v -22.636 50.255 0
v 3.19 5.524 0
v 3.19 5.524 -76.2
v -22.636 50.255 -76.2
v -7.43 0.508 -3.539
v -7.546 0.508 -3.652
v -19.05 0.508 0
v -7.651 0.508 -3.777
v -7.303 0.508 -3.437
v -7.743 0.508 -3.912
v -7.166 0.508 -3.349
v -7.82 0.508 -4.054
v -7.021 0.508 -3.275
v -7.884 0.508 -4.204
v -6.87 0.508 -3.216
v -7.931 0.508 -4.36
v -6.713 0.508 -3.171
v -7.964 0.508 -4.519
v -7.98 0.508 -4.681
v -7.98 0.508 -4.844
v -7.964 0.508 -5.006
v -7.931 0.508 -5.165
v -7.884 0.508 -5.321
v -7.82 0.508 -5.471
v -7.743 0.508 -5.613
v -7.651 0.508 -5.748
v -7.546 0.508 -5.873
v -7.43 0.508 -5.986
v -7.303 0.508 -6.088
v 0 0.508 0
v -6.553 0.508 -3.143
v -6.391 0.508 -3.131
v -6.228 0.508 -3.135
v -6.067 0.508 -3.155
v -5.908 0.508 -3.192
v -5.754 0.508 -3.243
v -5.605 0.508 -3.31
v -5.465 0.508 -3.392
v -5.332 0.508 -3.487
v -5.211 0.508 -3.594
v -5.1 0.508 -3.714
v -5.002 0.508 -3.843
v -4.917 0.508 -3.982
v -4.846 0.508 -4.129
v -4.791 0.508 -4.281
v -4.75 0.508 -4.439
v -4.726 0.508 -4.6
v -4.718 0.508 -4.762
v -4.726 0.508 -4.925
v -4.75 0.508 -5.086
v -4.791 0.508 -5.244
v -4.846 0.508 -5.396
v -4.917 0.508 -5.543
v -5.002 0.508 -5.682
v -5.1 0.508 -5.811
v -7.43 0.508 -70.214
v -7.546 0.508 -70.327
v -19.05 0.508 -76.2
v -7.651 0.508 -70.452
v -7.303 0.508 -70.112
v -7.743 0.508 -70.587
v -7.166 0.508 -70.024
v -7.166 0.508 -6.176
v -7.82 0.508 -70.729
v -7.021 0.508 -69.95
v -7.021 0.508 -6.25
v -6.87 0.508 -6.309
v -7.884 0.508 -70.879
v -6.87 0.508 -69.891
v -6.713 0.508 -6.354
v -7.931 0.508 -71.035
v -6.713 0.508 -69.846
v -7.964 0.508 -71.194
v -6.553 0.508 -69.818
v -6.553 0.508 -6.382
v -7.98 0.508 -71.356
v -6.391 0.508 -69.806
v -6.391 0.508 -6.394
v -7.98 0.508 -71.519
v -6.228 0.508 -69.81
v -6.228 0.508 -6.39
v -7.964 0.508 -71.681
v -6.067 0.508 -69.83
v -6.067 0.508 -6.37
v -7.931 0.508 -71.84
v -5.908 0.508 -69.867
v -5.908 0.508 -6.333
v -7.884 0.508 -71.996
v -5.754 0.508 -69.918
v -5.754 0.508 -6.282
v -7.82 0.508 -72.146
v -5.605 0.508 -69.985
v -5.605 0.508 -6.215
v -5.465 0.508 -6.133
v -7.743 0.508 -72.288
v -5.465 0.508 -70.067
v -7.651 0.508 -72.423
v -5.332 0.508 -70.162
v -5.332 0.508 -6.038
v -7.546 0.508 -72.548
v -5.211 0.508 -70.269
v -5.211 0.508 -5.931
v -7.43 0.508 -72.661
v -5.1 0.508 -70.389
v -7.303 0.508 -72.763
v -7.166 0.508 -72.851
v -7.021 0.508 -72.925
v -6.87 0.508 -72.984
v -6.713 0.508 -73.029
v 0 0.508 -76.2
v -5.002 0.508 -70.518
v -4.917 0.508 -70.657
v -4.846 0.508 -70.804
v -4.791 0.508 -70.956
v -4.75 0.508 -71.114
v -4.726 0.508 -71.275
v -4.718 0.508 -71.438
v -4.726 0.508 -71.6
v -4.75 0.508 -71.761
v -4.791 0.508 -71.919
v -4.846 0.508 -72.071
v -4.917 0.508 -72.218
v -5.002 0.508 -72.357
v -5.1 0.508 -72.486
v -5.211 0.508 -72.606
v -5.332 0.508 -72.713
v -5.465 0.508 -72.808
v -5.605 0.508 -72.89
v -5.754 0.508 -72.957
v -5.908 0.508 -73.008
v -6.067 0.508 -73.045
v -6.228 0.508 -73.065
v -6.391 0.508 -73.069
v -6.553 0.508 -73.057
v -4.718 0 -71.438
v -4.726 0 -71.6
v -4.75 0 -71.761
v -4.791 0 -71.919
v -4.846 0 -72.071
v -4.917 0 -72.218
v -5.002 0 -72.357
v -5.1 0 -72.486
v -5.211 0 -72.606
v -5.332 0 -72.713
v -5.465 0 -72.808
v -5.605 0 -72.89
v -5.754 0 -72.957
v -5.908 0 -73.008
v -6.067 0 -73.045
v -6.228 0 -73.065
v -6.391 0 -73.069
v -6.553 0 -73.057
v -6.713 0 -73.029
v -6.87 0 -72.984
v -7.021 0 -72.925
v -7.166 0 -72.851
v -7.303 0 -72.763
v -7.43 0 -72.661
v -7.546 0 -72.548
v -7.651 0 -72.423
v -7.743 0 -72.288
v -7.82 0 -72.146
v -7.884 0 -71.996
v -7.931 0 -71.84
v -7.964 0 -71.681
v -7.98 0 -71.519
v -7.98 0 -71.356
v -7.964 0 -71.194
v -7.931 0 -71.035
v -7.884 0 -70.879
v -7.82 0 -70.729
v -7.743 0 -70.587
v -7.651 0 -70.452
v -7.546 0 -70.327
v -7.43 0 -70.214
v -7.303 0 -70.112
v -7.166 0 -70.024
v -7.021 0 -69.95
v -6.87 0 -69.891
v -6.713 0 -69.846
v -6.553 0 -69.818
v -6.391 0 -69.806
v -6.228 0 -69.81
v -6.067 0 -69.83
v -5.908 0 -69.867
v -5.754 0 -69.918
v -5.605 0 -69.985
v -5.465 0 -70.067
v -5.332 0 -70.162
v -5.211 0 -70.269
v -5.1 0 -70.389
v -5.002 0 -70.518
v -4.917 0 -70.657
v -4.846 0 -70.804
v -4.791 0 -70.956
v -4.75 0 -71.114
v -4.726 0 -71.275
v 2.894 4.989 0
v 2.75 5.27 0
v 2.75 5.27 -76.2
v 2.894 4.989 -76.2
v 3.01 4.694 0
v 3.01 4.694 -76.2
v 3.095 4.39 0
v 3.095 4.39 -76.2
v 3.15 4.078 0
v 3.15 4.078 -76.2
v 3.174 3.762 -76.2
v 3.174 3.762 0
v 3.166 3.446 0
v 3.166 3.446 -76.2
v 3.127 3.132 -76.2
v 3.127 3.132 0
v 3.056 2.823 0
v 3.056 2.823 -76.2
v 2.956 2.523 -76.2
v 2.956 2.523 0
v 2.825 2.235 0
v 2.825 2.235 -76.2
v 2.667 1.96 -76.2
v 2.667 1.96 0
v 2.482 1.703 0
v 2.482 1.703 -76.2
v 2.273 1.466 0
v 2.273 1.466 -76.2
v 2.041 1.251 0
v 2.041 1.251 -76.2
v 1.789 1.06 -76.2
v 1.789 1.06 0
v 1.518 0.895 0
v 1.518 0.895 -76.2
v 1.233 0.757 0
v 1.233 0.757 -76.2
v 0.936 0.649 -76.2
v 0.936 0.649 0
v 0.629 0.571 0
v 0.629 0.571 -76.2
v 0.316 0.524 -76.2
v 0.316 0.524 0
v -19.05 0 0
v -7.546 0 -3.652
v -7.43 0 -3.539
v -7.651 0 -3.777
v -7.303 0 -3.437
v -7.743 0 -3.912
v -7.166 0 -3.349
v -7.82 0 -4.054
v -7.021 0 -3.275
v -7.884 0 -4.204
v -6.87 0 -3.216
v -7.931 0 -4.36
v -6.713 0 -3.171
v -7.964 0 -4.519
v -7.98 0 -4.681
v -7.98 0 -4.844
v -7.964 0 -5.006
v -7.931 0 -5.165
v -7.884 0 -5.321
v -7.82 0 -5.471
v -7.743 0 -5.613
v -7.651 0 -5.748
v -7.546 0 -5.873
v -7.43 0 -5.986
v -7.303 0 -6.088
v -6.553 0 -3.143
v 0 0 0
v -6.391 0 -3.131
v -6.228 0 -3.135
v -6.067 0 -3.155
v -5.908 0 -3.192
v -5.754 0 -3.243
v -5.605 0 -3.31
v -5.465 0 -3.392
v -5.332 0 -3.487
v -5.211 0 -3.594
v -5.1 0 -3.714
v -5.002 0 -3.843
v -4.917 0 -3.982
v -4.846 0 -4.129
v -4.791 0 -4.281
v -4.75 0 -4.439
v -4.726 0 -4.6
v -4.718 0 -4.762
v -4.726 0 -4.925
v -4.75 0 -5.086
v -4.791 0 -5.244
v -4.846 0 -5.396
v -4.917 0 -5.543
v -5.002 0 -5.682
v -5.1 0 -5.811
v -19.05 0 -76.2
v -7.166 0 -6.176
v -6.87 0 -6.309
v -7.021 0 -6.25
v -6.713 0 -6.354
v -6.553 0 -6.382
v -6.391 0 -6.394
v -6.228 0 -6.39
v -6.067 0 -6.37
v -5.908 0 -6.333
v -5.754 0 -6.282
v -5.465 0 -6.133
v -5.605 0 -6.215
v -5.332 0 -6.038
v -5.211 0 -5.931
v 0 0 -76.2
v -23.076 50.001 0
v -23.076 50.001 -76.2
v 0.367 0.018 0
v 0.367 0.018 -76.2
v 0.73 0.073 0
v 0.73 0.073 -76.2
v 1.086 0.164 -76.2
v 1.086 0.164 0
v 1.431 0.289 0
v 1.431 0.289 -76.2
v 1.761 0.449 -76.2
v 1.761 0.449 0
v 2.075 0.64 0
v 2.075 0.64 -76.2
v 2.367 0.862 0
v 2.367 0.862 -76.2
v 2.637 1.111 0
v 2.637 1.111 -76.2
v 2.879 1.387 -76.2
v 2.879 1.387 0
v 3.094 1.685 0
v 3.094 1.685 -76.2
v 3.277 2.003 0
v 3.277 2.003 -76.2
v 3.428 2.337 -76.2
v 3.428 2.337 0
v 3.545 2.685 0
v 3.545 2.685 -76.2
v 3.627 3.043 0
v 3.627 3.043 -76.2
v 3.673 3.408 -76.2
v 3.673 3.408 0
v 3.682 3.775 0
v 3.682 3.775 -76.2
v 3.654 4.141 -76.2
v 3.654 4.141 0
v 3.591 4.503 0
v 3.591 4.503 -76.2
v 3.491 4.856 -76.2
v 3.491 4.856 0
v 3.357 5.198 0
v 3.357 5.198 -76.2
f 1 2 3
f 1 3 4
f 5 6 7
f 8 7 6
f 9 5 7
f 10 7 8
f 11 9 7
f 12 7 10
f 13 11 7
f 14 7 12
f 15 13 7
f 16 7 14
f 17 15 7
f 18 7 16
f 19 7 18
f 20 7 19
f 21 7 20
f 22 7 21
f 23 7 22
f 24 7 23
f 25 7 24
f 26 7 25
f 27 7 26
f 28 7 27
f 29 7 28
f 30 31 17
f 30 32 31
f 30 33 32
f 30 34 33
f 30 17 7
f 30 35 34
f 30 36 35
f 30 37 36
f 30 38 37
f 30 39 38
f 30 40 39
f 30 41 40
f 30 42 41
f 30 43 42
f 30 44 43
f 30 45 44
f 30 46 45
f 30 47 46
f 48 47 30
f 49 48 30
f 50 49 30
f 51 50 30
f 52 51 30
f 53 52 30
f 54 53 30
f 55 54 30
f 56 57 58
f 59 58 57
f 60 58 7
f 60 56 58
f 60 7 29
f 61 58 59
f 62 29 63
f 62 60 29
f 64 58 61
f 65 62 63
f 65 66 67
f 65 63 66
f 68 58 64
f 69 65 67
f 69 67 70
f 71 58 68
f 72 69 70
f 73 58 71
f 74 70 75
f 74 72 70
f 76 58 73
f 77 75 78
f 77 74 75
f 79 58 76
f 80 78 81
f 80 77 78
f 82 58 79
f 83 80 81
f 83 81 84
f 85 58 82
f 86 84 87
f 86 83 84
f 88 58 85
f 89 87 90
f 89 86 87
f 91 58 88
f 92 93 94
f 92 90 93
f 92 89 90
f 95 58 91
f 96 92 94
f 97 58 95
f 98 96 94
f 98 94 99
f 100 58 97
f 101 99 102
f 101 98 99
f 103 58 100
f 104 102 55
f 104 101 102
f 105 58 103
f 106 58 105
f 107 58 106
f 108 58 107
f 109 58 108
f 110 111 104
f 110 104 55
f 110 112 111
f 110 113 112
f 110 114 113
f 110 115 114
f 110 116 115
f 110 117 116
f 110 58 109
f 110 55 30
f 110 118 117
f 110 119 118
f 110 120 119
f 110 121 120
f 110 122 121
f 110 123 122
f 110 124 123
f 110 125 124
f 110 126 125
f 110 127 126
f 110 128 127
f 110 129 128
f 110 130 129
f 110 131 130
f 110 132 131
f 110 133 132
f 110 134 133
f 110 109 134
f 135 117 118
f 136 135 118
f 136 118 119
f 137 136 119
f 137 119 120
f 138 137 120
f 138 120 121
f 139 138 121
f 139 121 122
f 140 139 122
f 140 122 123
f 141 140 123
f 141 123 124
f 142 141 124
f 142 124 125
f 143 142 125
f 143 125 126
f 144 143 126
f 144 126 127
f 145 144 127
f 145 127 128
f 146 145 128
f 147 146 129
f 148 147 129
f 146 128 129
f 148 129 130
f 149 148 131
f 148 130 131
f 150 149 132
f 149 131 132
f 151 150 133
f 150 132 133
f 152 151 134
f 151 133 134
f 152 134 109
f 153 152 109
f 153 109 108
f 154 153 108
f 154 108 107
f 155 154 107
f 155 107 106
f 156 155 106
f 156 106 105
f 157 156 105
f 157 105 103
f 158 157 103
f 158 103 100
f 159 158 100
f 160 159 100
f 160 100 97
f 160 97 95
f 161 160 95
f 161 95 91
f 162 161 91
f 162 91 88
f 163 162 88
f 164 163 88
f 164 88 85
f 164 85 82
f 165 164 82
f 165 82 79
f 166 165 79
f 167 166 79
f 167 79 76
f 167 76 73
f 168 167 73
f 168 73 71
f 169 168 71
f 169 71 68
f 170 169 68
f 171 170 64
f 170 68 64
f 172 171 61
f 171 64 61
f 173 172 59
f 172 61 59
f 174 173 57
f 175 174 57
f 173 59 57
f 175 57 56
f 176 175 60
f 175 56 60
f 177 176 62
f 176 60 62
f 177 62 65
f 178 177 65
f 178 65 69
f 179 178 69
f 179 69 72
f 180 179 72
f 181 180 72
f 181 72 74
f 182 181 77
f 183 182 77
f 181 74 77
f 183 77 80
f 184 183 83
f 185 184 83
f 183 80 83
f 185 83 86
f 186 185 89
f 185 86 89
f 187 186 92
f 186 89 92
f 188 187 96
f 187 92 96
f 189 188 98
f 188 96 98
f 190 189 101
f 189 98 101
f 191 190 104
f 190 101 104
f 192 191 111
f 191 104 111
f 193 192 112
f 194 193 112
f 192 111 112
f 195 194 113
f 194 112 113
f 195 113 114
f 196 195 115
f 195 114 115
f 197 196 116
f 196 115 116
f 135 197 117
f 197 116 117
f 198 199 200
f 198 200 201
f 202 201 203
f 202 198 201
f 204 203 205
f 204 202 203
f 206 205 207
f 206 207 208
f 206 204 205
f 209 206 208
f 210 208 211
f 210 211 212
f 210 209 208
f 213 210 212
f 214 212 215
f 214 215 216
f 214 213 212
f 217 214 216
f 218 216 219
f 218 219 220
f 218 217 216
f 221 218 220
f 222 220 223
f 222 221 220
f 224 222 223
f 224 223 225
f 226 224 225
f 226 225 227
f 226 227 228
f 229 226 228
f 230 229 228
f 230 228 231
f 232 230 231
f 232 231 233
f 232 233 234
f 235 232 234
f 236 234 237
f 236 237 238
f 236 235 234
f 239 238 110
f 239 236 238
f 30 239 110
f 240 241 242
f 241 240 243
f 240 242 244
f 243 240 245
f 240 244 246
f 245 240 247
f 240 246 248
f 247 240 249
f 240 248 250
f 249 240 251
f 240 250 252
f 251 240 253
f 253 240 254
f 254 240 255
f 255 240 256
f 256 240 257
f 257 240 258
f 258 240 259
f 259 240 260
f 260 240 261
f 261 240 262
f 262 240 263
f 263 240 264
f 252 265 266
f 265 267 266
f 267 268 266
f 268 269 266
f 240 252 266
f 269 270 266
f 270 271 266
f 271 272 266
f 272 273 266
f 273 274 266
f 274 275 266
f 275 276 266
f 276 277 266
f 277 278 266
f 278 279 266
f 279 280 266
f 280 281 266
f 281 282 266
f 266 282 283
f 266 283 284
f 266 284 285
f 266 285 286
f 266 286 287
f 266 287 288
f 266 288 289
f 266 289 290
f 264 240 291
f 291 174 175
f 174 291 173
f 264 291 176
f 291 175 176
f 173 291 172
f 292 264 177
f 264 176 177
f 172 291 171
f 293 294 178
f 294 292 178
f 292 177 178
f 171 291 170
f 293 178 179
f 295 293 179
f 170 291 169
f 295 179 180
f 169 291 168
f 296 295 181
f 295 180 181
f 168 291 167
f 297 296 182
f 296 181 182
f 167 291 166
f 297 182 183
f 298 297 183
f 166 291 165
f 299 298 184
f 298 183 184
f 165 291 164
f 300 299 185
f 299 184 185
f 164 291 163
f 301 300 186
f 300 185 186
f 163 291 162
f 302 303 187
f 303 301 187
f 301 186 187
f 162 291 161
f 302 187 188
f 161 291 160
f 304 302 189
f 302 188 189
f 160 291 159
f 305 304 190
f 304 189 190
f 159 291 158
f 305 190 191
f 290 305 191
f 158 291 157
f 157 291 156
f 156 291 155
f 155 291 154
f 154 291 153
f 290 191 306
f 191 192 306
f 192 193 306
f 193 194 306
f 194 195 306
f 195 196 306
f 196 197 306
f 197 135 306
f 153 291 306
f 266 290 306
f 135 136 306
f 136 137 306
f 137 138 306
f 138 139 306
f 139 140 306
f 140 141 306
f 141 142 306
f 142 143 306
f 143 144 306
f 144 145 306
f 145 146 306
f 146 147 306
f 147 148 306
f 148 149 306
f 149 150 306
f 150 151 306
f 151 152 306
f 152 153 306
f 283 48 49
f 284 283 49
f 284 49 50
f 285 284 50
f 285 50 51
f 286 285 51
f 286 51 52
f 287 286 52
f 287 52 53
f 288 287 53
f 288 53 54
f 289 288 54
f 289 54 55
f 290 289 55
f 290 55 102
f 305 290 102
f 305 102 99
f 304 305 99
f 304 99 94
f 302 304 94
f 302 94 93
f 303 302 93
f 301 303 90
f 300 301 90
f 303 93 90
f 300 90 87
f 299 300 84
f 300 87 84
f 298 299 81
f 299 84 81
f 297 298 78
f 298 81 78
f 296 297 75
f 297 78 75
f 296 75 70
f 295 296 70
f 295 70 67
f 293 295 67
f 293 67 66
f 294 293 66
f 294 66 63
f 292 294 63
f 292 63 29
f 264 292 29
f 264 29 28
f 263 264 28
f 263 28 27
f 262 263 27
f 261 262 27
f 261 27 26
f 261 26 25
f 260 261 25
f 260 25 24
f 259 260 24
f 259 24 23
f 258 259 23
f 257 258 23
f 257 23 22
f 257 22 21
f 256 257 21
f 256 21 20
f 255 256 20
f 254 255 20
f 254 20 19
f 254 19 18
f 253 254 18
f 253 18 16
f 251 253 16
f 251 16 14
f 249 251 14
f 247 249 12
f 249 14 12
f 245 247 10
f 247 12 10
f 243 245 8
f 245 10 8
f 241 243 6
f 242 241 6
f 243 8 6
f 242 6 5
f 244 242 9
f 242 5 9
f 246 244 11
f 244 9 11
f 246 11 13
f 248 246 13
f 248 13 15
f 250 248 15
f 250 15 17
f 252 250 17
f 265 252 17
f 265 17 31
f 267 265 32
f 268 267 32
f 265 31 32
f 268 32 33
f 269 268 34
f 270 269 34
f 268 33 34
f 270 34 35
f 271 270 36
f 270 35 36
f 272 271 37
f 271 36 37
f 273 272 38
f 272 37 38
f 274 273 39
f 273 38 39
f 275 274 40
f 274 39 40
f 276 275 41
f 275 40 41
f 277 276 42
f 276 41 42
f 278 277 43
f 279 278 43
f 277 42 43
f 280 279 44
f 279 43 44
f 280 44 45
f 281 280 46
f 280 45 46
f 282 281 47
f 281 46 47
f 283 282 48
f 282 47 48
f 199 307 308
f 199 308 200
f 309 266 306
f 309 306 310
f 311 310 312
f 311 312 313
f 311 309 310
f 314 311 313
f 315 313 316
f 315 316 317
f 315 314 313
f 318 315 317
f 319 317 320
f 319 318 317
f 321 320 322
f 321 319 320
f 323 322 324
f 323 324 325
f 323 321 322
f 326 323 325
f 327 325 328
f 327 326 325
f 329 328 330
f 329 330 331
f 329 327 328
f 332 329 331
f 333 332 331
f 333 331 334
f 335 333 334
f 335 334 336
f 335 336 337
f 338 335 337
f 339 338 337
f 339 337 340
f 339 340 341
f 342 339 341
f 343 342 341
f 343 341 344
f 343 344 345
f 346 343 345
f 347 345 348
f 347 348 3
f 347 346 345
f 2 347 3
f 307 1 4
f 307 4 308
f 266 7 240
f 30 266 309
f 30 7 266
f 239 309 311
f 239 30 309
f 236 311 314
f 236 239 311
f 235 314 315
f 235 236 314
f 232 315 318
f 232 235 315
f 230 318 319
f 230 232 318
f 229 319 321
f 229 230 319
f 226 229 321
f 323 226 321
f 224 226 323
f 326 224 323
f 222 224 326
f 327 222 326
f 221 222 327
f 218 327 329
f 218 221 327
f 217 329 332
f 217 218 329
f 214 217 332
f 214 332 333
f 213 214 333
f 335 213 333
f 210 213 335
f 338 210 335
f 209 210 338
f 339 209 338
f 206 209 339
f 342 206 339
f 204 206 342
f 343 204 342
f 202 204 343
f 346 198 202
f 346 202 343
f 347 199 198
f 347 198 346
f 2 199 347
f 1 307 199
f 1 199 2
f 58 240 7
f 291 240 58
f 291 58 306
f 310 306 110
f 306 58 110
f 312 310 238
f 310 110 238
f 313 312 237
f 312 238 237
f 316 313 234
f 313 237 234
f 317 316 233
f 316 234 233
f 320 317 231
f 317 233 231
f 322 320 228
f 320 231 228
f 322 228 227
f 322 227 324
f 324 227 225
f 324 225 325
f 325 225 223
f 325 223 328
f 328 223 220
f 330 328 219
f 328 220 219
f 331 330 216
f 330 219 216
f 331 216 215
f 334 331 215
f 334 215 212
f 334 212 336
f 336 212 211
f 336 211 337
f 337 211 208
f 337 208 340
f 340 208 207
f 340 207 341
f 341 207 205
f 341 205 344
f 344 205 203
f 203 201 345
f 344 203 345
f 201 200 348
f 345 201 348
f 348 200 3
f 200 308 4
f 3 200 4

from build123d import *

# Parameters (mm, degrees)
SKETCH2_W                 = 19.05
SKETCH2_H                 = 76.2
BOSS_EXTRUDE2_DEPTH       = 0.508
EDGE_FLANGE2_DEPTH        = 76.2
F_4_CLEARANCE_HOLE1_D     = 3.2639
F_4_CLEARANCE_HOLE1_DEPTH = 0.508


# Sheet-metal steps are written as plain solids
with BuildPart() as part:
    # Sketch2 → Boss-Extrude2 (new body)
    with BuildSketch(Plane(origin=(0, 0, 0), x_dir=(1, 0, 0), z_dir=(0, 1, 0))):
        with Locations((-9.525, 38.1)):
            Rectangle(SKETCH2_W, SKETCH2_H)
    extrude(amount=BOSS_EXTRUDE2_DEPTH)

    # Edge-Flange2 section (across the edge) → Edge-Flange2 (add)
    with BuildSketch(Plane(origin=(5.499261314, 0.508, 0), x_dir=(-0.8660254037844398, -0.499999999999998, 0), z_dir=(0, 0, -1))):
        with BuildLine():
            Line((-0.508, 5.499261314), (-0.508, 57.15))
            Line((-0.508, 57.15), (0, 57.15))
            Line((0, 57.15), (0, 5.499261314))
            ThreePointArc((0, 5.499261314), (1.5875, 2.749630657), (4.7625, 2.749630657))
            Line((4.7625, 2.749630657), (5.0165, 2.309689752))
            ThreePointArc((5.0165, 2.309689752), (1.3335, 2.309689752), (-0.508, 5.499261314))
        make_face()
    extrude(amount=EDGE_FLANGE2_DEPTH)

    # #4 Clearance Hole1
    with Locations(Plane(origin=(0, 0, 0), x_dir=(-1, 0, 0), z_dir=(0, -1, 0))):
        with Locations((6.35, 71.4375), (6.35, 4.7625)):
            Hole(F_4_CLEARANCE_HOLE1_D / 2, depth=F_4_CLEARANCE_HOLE1_DEPTH)


solid = part.part
